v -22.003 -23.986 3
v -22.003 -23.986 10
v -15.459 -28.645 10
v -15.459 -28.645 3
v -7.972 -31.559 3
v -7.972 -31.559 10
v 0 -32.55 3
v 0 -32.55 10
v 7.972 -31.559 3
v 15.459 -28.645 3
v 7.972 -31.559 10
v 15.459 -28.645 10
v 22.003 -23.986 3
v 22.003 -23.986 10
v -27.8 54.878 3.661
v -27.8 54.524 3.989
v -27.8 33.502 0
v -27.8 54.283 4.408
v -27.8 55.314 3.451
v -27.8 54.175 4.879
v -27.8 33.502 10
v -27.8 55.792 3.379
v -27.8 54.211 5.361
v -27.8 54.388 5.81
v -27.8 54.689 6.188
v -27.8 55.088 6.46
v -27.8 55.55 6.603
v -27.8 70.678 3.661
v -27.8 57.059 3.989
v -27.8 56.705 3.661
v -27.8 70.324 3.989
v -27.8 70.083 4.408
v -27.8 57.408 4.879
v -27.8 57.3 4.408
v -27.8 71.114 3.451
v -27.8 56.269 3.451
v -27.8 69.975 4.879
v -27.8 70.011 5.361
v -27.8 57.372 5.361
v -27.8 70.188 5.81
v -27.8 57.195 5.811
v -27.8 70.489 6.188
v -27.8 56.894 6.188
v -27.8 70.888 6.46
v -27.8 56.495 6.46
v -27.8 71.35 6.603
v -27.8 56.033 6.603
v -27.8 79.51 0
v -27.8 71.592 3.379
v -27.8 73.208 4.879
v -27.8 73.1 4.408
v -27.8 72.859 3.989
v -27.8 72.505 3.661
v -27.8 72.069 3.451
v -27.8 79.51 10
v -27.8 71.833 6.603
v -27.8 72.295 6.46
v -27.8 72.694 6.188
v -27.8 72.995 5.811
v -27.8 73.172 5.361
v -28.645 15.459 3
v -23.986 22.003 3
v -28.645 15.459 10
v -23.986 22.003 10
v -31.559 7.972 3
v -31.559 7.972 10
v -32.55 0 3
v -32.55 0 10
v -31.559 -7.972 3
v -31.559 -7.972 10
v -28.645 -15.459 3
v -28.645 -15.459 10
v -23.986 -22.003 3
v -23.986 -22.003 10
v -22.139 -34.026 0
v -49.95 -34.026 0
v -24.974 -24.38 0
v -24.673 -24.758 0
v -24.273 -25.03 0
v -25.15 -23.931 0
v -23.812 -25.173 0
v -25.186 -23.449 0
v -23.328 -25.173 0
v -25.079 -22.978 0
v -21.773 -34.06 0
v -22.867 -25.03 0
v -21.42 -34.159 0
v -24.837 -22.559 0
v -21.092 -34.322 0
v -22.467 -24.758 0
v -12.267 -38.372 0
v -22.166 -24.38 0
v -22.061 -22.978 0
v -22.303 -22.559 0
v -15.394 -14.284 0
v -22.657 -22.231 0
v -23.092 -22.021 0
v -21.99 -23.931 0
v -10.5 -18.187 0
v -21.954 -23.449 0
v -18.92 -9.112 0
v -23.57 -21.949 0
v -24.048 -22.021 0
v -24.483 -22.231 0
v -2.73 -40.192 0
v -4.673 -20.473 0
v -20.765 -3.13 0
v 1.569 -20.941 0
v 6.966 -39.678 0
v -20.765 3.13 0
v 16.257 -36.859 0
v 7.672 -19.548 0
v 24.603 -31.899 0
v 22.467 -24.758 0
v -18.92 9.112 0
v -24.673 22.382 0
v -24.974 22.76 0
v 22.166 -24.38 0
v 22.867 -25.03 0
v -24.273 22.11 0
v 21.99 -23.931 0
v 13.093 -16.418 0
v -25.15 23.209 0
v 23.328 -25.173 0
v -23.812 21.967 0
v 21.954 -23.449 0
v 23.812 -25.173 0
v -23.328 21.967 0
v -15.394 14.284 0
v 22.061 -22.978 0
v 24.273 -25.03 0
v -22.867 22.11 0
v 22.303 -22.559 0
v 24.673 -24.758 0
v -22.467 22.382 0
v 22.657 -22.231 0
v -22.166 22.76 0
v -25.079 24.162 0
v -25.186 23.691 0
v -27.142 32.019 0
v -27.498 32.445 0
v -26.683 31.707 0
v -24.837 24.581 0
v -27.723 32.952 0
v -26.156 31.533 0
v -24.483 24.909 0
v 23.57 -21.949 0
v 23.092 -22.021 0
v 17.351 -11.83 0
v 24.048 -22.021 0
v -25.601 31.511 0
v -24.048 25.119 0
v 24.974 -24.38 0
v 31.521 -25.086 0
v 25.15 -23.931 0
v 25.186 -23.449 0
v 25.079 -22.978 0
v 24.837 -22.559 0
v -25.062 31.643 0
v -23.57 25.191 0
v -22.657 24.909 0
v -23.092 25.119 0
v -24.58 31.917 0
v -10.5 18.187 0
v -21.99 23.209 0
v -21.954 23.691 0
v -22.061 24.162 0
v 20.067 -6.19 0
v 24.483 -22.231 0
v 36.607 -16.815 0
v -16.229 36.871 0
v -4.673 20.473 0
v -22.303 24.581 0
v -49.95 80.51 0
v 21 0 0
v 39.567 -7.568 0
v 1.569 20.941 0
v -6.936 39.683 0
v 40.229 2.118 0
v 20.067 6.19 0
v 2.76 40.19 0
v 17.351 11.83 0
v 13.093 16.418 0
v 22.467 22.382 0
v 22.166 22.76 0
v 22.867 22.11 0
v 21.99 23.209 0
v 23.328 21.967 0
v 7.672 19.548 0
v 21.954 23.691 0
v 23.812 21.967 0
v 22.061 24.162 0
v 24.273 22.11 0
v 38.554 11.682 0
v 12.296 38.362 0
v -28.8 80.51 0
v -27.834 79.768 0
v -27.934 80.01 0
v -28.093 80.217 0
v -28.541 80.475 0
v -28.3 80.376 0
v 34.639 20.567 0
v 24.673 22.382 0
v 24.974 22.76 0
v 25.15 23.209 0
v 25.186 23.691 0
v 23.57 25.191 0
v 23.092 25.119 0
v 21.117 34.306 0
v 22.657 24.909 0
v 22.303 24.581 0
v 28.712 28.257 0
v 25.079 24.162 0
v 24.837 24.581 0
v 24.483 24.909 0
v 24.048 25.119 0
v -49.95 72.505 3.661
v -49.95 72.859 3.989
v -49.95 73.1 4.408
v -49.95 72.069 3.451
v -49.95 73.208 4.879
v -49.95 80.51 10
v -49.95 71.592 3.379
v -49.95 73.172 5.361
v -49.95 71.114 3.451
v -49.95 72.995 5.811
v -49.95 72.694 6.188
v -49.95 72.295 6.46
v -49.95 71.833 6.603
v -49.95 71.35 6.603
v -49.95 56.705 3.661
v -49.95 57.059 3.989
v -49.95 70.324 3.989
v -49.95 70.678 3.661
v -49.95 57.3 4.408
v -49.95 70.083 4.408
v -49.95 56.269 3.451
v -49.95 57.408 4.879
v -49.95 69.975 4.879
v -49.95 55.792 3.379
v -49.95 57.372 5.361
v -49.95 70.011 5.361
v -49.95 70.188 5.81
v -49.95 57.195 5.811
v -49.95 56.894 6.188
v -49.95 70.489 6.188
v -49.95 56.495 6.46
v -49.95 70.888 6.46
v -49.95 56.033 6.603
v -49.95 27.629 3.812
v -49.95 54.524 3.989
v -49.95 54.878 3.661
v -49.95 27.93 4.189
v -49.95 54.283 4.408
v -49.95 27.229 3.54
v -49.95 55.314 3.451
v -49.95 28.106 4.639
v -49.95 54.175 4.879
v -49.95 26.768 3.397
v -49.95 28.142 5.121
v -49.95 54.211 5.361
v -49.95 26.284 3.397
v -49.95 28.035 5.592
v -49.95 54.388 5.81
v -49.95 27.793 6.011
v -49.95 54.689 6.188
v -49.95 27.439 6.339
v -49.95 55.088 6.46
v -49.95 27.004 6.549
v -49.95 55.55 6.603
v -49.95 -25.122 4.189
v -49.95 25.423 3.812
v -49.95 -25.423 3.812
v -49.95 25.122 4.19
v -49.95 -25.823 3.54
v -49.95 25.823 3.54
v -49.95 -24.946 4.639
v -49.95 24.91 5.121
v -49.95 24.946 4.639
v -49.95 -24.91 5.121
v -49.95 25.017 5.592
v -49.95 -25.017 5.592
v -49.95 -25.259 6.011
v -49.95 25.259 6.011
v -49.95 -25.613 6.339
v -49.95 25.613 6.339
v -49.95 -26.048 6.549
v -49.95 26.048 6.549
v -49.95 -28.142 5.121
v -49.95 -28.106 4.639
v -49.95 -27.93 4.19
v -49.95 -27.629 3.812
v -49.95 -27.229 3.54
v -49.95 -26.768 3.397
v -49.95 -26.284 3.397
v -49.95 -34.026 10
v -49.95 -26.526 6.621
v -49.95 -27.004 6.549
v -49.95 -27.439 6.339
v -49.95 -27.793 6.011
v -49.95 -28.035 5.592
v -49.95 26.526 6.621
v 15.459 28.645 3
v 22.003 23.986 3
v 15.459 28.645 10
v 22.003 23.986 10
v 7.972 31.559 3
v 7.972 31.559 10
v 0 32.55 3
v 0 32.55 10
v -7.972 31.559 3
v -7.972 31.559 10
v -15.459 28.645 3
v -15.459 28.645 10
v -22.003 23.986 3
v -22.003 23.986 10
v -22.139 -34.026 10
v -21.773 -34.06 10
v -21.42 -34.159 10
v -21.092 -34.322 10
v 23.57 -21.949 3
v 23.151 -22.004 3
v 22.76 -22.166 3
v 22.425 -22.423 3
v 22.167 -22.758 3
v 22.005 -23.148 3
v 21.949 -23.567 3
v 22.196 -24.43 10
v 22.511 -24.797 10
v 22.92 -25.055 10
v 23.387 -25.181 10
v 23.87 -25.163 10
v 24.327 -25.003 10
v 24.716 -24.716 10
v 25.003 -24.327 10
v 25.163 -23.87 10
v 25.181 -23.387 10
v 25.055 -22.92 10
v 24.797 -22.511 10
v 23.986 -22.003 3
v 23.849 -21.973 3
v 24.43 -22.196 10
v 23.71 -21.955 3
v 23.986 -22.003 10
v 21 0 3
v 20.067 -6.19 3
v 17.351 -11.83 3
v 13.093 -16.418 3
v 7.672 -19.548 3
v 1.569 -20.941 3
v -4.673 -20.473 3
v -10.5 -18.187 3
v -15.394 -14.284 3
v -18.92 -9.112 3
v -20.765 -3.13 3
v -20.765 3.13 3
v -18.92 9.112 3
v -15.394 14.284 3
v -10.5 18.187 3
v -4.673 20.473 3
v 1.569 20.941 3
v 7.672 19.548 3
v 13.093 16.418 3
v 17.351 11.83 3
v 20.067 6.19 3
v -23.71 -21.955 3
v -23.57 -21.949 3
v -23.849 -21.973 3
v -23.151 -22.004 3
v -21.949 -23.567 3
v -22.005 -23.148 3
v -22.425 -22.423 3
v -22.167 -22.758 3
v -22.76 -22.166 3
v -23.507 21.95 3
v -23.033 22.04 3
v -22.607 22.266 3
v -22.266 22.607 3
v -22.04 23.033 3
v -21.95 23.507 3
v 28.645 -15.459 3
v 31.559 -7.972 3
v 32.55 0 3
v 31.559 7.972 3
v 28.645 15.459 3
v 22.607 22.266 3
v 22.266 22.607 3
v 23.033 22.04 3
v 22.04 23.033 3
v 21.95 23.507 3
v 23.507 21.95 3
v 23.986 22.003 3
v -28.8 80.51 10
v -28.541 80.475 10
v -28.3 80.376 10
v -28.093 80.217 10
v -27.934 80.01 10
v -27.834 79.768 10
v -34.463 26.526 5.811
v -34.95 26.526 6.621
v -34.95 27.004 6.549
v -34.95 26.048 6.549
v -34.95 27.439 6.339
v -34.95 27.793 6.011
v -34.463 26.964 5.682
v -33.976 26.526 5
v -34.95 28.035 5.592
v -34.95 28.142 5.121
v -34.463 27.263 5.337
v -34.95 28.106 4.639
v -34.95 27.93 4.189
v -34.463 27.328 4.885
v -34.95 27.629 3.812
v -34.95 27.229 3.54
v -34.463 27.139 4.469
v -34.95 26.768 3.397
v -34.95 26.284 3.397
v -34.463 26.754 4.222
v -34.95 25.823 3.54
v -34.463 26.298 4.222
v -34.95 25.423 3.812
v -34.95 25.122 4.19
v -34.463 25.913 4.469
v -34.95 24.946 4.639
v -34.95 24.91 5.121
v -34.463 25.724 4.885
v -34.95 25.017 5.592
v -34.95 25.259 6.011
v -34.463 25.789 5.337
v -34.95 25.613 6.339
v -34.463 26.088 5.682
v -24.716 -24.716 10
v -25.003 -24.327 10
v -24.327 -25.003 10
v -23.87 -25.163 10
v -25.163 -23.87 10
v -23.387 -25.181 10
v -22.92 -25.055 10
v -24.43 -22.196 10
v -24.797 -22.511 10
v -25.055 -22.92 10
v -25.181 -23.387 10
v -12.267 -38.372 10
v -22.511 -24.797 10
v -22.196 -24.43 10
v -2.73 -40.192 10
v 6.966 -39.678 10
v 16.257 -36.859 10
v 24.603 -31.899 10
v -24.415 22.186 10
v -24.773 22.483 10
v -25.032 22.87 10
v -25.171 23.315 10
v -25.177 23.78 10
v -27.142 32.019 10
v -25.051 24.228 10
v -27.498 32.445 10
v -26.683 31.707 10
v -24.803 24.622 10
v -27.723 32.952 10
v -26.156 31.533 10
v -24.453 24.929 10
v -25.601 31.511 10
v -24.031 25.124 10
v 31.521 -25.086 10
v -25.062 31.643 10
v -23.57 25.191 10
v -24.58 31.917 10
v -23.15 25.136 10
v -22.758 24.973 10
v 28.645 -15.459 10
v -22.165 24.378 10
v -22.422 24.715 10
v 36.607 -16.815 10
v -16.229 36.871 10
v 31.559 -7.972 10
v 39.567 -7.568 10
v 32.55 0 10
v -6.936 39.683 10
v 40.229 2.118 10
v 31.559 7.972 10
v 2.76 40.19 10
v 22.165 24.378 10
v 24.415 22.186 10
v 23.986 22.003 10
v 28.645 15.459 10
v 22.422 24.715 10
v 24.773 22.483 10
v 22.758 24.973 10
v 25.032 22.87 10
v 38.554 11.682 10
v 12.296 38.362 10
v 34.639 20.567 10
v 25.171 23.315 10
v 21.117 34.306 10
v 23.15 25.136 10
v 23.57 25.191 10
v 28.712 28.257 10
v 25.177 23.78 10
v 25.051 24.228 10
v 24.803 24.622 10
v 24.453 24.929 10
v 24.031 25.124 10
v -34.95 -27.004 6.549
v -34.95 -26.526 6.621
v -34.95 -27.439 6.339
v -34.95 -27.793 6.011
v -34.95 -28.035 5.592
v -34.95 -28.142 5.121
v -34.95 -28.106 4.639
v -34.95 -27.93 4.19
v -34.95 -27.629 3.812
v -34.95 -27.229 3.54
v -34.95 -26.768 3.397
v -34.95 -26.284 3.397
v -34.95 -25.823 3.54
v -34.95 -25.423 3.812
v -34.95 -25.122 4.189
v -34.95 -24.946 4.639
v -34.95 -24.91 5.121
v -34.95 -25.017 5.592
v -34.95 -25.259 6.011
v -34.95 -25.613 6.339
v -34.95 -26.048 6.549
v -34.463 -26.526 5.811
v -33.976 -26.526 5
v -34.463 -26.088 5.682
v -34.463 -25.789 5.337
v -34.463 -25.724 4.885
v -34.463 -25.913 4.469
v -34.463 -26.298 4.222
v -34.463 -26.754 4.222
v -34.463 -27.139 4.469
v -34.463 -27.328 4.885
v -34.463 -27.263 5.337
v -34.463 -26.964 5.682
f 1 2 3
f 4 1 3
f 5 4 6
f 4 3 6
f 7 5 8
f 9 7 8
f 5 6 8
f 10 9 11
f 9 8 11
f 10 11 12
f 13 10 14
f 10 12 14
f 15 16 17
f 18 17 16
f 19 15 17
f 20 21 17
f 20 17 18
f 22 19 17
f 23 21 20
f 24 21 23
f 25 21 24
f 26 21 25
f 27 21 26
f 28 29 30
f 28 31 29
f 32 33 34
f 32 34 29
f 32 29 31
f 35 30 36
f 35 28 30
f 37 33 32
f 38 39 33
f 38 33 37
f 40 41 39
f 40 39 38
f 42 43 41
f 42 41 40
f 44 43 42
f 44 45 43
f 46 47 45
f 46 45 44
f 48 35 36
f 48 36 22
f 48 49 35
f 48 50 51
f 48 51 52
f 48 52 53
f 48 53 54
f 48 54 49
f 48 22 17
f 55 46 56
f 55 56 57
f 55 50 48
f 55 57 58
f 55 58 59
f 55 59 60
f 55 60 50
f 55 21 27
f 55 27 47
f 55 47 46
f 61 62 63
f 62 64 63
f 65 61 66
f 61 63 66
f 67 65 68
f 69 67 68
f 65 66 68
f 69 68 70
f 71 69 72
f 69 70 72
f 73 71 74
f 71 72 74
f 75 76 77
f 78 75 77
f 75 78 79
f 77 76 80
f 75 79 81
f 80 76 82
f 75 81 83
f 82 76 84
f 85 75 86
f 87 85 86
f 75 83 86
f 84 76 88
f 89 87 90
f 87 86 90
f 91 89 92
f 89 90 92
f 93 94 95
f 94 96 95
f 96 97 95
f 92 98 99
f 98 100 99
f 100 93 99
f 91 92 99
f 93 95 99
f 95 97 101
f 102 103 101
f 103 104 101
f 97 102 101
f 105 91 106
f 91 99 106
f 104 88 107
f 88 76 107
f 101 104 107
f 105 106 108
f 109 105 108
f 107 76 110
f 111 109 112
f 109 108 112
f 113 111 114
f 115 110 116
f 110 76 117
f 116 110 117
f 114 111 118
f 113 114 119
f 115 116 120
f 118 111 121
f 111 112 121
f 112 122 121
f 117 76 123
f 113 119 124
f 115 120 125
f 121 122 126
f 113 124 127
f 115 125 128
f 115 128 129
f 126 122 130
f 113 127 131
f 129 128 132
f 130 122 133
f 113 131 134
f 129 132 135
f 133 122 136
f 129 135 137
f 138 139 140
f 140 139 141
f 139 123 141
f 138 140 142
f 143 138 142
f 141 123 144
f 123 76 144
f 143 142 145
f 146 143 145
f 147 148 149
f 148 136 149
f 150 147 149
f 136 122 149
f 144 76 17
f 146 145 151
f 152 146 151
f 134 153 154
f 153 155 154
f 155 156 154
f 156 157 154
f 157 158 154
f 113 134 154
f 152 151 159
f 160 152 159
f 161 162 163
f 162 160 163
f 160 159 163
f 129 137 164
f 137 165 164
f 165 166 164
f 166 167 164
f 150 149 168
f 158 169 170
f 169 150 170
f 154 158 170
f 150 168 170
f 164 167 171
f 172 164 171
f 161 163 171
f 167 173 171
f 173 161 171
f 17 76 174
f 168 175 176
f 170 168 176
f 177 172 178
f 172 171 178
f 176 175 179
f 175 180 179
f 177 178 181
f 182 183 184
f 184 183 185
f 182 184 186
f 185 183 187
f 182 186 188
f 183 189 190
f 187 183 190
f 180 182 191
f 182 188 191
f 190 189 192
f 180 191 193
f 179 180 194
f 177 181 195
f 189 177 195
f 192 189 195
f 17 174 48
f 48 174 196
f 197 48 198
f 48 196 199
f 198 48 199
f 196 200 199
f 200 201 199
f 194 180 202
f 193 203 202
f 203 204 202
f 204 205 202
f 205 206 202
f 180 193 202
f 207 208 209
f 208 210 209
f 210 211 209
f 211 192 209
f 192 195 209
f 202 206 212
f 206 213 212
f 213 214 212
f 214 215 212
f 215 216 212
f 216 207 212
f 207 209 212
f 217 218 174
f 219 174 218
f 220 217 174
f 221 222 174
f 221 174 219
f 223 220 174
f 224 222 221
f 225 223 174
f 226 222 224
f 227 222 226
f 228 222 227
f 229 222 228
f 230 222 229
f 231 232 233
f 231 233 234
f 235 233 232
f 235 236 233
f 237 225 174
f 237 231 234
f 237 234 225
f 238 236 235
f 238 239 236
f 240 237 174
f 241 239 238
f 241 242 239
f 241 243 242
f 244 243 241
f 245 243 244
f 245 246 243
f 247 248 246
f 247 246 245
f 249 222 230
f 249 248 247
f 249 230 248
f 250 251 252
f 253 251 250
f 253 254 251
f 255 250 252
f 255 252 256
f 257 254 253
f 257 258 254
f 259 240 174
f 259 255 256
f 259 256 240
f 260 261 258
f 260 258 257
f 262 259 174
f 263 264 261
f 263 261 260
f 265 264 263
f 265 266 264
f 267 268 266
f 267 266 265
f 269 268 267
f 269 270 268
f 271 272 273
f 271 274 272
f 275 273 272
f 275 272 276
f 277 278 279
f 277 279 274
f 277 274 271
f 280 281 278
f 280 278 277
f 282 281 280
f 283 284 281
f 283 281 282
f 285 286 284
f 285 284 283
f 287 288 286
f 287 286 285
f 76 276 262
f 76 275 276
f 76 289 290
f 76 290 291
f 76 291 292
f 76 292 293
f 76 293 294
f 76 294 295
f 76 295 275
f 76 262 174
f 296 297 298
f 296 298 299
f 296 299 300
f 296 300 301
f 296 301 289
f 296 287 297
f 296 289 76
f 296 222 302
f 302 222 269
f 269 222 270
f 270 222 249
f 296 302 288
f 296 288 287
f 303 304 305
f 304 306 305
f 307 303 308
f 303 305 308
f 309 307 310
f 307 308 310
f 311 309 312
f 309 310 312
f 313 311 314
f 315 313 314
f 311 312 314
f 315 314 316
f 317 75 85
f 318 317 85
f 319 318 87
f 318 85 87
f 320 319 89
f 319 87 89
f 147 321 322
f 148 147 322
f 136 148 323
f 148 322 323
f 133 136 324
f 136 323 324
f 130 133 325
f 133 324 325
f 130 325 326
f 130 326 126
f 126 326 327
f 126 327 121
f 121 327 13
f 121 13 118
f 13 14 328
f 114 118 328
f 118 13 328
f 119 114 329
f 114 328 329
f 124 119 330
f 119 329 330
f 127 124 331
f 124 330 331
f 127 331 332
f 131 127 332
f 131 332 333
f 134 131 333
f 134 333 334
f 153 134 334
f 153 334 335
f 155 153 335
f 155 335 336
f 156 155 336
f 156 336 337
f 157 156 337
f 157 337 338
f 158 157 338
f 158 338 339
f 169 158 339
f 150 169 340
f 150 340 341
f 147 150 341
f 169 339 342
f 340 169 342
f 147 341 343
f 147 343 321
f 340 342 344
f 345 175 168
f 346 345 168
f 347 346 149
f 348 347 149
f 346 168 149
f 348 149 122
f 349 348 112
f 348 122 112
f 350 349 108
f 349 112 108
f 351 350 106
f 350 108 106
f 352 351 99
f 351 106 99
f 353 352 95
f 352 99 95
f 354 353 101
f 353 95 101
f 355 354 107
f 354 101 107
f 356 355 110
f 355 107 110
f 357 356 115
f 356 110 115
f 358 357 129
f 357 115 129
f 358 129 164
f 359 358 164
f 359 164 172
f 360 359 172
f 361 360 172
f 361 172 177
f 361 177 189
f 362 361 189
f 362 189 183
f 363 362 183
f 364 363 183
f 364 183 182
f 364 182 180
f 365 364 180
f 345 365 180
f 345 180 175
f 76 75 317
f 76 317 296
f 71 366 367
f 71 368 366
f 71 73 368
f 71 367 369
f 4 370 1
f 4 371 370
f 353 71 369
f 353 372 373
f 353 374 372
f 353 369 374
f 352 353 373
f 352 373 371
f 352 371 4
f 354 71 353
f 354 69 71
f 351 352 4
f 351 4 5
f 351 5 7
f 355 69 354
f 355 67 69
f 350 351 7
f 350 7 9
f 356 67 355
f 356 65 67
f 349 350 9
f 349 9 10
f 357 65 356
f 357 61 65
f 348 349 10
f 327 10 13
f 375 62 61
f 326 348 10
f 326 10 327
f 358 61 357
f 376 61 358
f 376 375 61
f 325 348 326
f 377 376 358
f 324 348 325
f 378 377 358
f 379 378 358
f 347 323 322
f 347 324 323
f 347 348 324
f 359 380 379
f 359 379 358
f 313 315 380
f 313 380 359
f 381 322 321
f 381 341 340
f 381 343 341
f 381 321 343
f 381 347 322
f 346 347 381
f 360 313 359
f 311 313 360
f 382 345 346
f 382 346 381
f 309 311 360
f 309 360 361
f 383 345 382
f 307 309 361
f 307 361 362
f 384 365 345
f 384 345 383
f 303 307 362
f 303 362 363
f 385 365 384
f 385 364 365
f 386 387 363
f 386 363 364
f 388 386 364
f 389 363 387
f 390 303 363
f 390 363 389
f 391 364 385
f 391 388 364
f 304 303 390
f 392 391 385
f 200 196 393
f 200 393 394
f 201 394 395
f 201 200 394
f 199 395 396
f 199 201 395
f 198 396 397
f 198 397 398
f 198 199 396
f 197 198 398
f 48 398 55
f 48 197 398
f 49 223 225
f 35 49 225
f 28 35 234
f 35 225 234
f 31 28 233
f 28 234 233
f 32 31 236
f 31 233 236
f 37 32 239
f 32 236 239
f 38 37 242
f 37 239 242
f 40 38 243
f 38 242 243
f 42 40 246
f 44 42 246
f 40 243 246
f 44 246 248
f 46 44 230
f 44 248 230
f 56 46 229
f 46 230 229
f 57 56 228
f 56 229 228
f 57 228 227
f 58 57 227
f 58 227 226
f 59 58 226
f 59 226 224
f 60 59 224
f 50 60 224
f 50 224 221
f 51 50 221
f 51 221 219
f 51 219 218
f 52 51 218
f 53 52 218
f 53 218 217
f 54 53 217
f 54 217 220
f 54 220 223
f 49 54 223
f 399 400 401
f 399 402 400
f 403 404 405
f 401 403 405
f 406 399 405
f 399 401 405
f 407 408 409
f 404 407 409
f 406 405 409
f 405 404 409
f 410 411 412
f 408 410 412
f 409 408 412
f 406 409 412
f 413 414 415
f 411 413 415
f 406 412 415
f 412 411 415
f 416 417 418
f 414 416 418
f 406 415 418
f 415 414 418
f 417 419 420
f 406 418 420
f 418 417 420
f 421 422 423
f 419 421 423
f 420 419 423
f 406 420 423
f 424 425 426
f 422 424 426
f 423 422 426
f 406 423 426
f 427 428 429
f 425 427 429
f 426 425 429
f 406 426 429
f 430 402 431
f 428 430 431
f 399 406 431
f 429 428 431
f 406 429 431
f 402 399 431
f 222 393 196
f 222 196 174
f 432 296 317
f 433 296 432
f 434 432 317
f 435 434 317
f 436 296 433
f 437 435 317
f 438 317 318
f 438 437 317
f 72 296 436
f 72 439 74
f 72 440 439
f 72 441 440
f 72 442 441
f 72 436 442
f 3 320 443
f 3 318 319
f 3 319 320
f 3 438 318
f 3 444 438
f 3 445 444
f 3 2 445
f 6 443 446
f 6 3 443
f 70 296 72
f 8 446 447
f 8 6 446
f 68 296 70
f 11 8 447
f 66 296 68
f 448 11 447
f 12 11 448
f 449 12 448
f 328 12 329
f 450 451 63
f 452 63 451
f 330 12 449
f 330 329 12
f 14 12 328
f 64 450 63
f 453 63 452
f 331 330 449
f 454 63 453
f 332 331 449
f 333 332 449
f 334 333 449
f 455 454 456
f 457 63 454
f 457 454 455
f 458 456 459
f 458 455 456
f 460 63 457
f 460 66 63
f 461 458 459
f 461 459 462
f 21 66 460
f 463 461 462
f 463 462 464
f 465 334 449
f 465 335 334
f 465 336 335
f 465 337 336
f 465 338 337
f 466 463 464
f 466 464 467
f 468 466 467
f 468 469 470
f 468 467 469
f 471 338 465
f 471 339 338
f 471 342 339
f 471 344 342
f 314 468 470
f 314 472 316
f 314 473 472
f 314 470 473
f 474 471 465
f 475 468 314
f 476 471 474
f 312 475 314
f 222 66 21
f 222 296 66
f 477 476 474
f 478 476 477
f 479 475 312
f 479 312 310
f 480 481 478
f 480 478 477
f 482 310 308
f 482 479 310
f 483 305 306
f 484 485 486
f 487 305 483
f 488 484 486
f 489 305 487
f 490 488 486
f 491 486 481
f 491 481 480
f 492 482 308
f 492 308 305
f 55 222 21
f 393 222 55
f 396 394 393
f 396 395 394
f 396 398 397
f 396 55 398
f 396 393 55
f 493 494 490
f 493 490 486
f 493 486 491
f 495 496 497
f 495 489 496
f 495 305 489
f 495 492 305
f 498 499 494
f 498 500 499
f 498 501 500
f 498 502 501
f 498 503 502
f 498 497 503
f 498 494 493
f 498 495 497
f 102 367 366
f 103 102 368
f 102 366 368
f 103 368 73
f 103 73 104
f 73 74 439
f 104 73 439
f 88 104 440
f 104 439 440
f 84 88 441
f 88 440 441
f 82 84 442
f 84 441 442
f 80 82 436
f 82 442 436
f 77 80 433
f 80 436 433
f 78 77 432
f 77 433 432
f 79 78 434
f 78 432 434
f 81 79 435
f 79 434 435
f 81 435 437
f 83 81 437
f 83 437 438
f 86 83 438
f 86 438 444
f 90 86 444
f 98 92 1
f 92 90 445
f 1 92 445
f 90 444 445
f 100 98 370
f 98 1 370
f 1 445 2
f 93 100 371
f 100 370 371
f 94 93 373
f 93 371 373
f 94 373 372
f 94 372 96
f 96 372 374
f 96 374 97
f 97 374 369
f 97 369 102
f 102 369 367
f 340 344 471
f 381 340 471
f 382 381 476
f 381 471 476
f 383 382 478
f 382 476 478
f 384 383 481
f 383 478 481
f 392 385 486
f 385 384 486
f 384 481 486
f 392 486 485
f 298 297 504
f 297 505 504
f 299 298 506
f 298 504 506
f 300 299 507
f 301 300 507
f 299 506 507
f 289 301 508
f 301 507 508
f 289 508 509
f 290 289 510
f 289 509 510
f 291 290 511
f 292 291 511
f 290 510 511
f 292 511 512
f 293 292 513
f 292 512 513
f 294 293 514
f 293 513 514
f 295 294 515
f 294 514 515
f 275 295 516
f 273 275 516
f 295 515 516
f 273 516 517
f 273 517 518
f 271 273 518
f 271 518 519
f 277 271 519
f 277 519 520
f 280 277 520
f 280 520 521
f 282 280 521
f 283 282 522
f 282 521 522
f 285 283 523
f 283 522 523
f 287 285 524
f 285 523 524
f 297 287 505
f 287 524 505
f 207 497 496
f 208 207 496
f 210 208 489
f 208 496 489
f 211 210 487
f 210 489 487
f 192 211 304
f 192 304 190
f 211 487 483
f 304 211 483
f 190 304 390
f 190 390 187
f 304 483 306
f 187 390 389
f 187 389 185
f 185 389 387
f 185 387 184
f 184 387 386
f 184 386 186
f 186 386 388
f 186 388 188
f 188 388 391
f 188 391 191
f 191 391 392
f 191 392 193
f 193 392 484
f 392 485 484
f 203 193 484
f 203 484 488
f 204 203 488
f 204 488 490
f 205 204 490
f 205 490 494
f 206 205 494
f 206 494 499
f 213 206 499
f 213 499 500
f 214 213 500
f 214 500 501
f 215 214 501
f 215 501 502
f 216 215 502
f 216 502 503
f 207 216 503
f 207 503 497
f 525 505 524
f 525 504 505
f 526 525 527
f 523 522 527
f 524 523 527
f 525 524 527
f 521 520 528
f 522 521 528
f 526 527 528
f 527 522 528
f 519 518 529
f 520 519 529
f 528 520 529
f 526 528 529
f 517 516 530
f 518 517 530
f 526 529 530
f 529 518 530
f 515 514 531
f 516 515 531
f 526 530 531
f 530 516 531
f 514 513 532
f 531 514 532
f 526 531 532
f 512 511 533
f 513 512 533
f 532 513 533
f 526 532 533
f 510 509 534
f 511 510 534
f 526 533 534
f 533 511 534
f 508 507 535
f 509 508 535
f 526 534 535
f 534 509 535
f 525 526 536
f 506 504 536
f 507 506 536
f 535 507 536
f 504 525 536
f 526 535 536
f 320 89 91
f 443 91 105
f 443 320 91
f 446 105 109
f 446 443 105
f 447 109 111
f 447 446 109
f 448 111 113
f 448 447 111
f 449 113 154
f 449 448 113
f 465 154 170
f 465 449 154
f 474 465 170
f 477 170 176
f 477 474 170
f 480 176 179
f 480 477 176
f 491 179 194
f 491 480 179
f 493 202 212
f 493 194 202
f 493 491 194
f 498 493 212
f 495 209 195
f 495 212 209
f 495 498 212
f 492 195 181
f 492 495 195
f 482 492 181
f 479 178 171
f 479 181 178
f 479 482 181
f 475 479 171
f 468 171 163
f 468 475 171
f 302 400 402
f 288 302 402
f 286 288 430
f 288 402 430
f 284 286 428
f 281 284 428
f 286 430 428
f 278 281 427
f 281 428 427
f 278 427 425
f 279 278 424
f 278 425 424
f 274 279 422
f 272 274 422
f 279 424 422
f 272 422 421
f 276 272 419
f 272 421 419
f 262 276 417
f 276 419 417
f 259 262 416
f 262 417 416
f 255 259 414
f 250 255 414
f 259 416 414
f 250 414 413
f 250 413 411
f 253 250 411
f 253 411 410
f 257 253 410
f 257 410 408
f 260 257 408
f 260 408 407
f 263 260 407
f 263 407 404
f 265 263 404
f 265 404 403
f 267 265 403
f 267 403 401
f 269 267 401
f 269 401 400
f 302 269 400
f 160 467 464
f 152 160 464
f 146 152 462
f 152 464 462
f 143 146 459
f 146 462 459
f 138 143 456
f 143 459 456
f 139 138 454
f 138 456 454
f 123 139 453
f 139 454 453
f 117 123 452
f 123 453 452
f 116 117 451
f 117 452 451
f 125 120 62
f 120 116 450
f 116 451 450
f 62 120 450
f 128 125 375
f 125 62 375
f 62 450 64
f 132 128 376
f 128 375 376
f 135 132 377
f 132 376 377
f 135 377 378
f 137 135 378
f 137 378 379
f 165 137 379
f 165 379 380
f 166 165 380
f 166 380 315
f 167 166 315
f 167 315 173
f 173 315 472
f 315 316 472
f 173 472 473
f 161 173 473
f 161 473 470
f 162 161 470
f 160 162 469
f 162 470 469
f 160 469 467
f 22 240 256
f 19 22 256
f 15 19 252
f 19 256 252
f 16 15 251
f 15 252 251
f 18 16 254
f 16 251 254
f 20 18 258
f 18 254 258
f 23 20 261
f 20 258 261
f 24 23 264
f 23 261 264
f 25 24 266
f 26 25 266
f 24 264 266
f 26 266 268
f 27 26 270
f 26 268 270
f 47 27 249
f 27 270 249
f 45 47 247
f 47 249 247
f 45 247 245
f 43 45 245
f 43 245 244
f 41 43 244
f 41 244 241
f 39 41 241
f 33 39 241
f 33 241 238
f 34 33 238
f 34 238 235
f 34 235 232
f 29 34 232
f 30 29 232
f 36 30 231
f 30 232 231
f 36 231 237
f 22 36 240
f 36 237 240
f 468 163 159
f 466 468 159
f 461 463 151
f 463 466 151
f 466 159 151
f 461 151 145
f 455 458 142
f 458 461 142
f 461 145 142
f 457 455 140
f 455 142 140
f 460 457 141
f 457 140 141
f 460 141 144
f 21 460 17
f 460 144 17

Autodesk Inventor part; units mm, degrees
ref_plane "YZ Plane" through (0, 0, 0) normal (1, 0, 0) x (0, 1, 0)
ref_plane "XZ Plane" through (0, 0, 0) normal (0, 1, 0) x (-1, 0, 0)
ref_plane "Work Plane1" through (0, 0, 0) normal (0, 0, 1) x (1, 0, 0)
sketch "Sketch1" plane through (0, 0, 0) normal (0, 0, 1) x (1, 0, 0)
  circle A0 centre (0, 0) radius 21 projected
  circle A1 centre (23.57, -23.57) radius 2 projected
  circle A2 centre (23.57, 23.57) radius 2 projected
  circle A3 centre (-23.57, -23.57) radius 2.5 projected
  circle A4 centre (-23.57, 23.57) radius 2 projected
  circle A5 centre (-23.57, -23.57) radius 2 projected
  circle A6 centre (0, 0) radius 19 projected
  circle A7 centre (-23.57, 23.57) radius 2.5 projected
  circle A8 centre (-23.57, -23.57) radius 2.5 projected
  arc A9 (-29.95, -24.95) -> (-24.95, -29.95) centre (-24.95, -24.95) ccw projected
  line L0 (24.95, -29.95) -> (-24.95, -29.95) projected
  arc A10 (24.95, -29.95) -> (29.95, -24.95) centre (24.95, -24.95) ccw projected
  line L1 (29.95, 24.95) -> (29.95, -24.95) projected
  arc A11 (29.95, 24.95) -> (24.95, 29.95) centre (24.95, 24.95) ccw projected
  line L2 (-24.95, 29.95) -> (24.95, 29.95) projected
  arc A12 (-24.95, 29.95) -> (-29.95, 24.95) centre (-24.95, 24.95) ccw projected
  line L3 (-29.95, -24.95) -> (-29.95, 24.95) projected
  circle A13 centre (23.57, -23.57) radius 2.5 projected
  circle A14 centre (23.57, 23.57) radius 2.5 projected
  line L4 (-49.95, -90) -> (-49.95, 90) projected
  line L5 (-59.95, -90) -> (-49.95, -90)
  line L6 (-59.95, 90) -> (-49.95, 90)
  line L7 (40.2846, 0) -> (-40.2846, 0)
  line L8 (-49.95, -90) -> (-49.95, 90) projected
  line L9 (-59.95, -90) -> (-49.95, -90)
  line L10 (-49.95, 35.5095) -> (-26.95, 35.5095) projected
  line L11 (-24.95, 29.95) -> (-49.95, 29.95)
  line L12 (-24.95, -29.95) -> (-49.95, -29.95)
  circle A15 centre (0, 0) radius 22
  line L13 (-32.95, 22) -> (-32.95, -22) projected
  line L14 (-30.95, -14.95) -> (-49.95, -14.95)
  line L15 (-30.95, 14.95) -> (-49.95, 14.95)
  line L16 (-30.95, -14.95) -> (-30.95, 14.95)
  line L17 (24.7214, -34.026) -> (0, -42.0585)
  line L18 (0, -42.0585) -> (-24.7214, -34.026)
  line L19 (-24.7214, -34.026) -> (-40, -12.9968)
  line L20 (-40, -12.9968) -> (-40, 12.9968)
  line L21 (-40, 12.9968) -> (-24.7214, 34.026)
  line L22 (-24.7214, 34.026) -> (0, 42.0585)
  line L23 (0, 42.0585) -> (24.7214, 34.026)
  line L24 (24.7214, 34.026) -> (40, 12.9968)
  line L25 (40, 12.9968) -> (40, -12.9968)
  line L26 (40, -12.9968) -> (24.7214, -34.026)
  line L27 (-24.7214, -34.026) -> (-49.95, -34.026)
  line L28 (-24.7214, 34.026) -> (-49.95, 34.026)
  arc A16 (-24.7214, -34.026) -> (-24.7214, 34.026) centre (0, 0) ccw projected
  line L29 (-24.7214, 34.026) -> (-27.8, 34.026) projected
  line L30 (-27.8, 34.026) -> (-27.8, 80.5095) projected
  line L31 (-27.8, 80.5095) -> (-49.95, 80.5095) projected
  line L32 (-49.95, 80.5095) -> (-49.95, 14.95) projected
  line L33 (-49.95, 14.95) -> (-35.95, 14.95) projected
  arc A17 (-30.95, 9.95) -> (-35.95, 14.95) centre (-35.95, 9.95) ccw projected
  line L34 (-30.95, 9.95) -> (-30.95, -9.95) projected
  arc A18 (-35.95, -14.95) -> (-30.95, -9.95) centre (-35.95, -9.95) ccw projected
  line L35 (-35.95, -14.95) -> (-49.95, -14.95) projected
  line L36 (-49.95, -14.95) -> (-49.95, -34.026) projected
  line L37 (-49.95, -34.026) -> (-24.7214, -34.026) projected
  circle A19 centre (15.9909, -0.539) radius 1.6 projected
  circle A20 centre (-11.6884, -10.9261) radius 2 projected
  circle A21 centre (11.6884, 10.9261) radius 2 projected
  circle A22 centre (10.9261, -11.6884) radius 2 projected
  circle A23 centre (-15.9909, 0.539) radius 1.6 projected
  circle A24 centre (-0.539, -15.9909) radius 1.6 projected
  circle A25 centre (0, 0) radius 12.5 projected
  circle A26 centre (0.539, 15.9909) radius 1.6 projected
  circle A27 centre (-10.9261, 11.6884) radius 2 projected
  point P0 (0, 0)
  point P1 (-23.2856, -45.1645)
  point P2 (-49.95, -75.9684)
  point P3 (-23.2856, 45.1645)
  point P4 (-49.95, -14.95)
  point P5 (-32.95, 13.95)
  point P6 (-32.95, 14.95)
  dimension "d9" = 1
  dimension "d10" = 15
  dimension "d11" = 15
  dimension "d12" = 1
  dimension "d13" = 40
extrude "Extrusion1" add sketch "Sketch1" along normal blind 10 contours L7 A15 A0 | A0 L7 A15 | A15 L7 L3 A12 L2 A11 L1 | L7 L1 A10 L0 A9 L3 A15 | L7 L25 L26 L17 L18 L19 L12 L0 A10 L1 | L1 A11 L2 L11 L21 L22 L23 L24 L25 L7 | L7 L16 L15 L21 L11 A12 L3 | L3 A9 L12 L19 L14 L16 L7 | L25 A16 | L16 A18 L13 L7 | L7 L13 A17 L16 | L24 A16 | A16 L26 | L13 A18 L14 L19 L20 L7 | L7 L20 L21 L15 A17 L13 | L16 L14 L13 A18 | A17 L13 L15 L16 | L23 A16 | A16 L17 | L19 L27 L4 L12 | L12 L4 L14 L19 | L21 L15 L4 L11 | L11 L4 L28 L21 | L20 L19 L14 L4 L15 L21 | A17 L15 L13 | L13 L14 A18 | L22 A16 | A16 L18 | A1 | A2 | A3 | A4 | A5 | A7 | A13 | A14
sketch "Sketch2" plane through (-49.95, -34.026, 0) normal (-1, 0, 0) x (0, 0, 1)
  line L0 (0, 68.0521) -> (0, 0) projected
  line L1 (0, 0) -> (10, 0) projected
  line L2 (10, 68.0521) -> (10, 0) projected
  line L3 (0, 68.0521) -> (0, 0) projected
  line L4 (10, 68.0521) -> (10, 0) projected
  line L5 (0, 68.0521) -> (10, 68.0521) projected
  line L6 (0, 0) -> (10, 0) projected
  line L7 (0, 68.0521) -> (10, 68.0521) projected
  point P0 (0, 34.026)
  point P1 (5, 7.5)
  point P2 (5, 60.5521)
  point P3 (5, 68.0521)
  point P4 (5, 19.076)
  dimension "d24" = 7.5
  dimension "d25" = 7.5
hole "Hole1" at (-49.95, 26.526, 5) at (-49.95, -26.526, 5) direction (1, 0, 0) diameter 3.242 depth 15 tip angle 118 thread size "M4x0.7" class "6H" standard "ISO Metric profile"
sketch "Sketch3" plane through (0, 0, 10) normal (0, 0, 1) x (1, 0, 0)
  arc A0 (-24.7214, -34.026) -> (-24.7214, 34.026) centre (0, 0) ccw projected
  line L0 (-24.7214, 34.026) -> (-27.8, 34.026) projected
  line L1 (-27.8, 34.026) -> (-27.8, 80.5095) projected
  line L2 (-27.8, 80.5095) -> (-49.95, 80.5095) projected
  line L3 (-49.95, 80.5095) -> (-49.95, 14.95) projected
  line L4 (-49.95, 14.95) -> (-35.95, 14.95) projected
  arc A1 (-30.95, 9.95) -> (-35.95, 14.95) centre (-35.95, 9.95) ccw projected
  line L5 (-30.95, 9.95) -> (-30.95, -9.95) projected
  arc A2 (-35.95, -14.95) -> (-30.95, -9.95) centre (-35.95, -9.95) ccw projected
  line L6 (-35.95, -14.95) -> (-49.95, -14.95) projected
  line L7 (-49.95, -14.95) -> (-49.95, -34.026) projected
  line L8 (-49.95, -34.026) -> (-24.7214, -34.026) projected
  circle A3 centre (15.9909, -0.539) radius 1.6 projected
  circle A4 centre (-11.6884, -10.9261) radius 2 projected
  circle A5 centre (11.6884, 10.9261) radius 2 projected
  circle A6 centre (10.9261, -11.6884) radius 2 projected
  circle A7 centre (-15.9909, 0.539) radius 1.6 projected
  circle A8 centre (-0.539, -15.9909) radius 1.6 projected
  circle A9 centre (0, 0) radius 12.5 projected
  circle A10 centre (0.539, 15.9909) radius 1.6 projected
  circle A11 centre (-10.9261, 11.6884) radius 2 projected
  circle A12 centre (0, 0) radius 19 projected
  circle A13 centre (-23.57, 23.57) radius 2.5 projected
  circle A14 centre (-23.57, -23.57) radius 2.5 projected
  arc A15 (-29.95, -24.95) -> (-24.95, -29.95) centre (-24.95, -24.95) ccw projected
  line L9 (24.95, -29.95) -> (-24.95, -29.95) projected
  arc A16 (24.95, -29.95) -> (29.95, -24.95) centre (24.95, -24.95) ccw projected
  line L10 (29.95, 24.95) -> (29.95, -24.95) projected
  arc A17 (29.95, 24.95) -> (24.95, 29.95) centre (24.95, 24.95) ccw projected
  line L11 (-24.95, 29.95) -> (24.95, 29.95) projected
  arc A18 (-24.95, 29.95) -> (-29.95, 24.95) centre (-24.95, 24.95) ccw projected
  line L12 (-29.95, -24.95) -> (-29.95, 24.95) projected
  circle A19 centre (23.57, -23.57) radius 2.5 projected
  circle A20 centre (23.57, 23.57) radius 2.5 projected
  arc A21 (-37.4079, -14.95) -> (-37.4079, 14.95) centre (0, 0) ccw
  line L13 (-27.8, 34.026) -> (-27.8, 29.155)
  line L14 (-49.95, -34.026) -> (-21.5657, -34.026)
  line L15 (-49.95, -34.026) -> (-24.7214, -34.026) projected
  point P0 (0, 0)
  point P1 (-24.7214, -34.026)
extrude "Extrusion2" cut sketch "Sketch3" against normal blind 10 contours L14 A21 L13 L0 A0
sketch "Sketch4" plane through (0, 0, 10) normal (0, 0, 1) x (1, 0, 0)
  arc A0 (-24.7214, -34.026) -> (-24.7214, 34.026) centre (0, 0) ccw projected
  line L0 (-24.7214, 34.026) -> (-27.8, 34.026) projected
  line L1 (-27.8, 34.026) -> (-27.8, 80.5095) projected
  line L2 (-27.8, 80.5095) -> (-49.95, 80.5095) projected
  line L3 (-49.95, 80.5095) -> (-49.95, 14.95) projected
  line L4 (-49.95, 14.95) -> (-35.95, 14.95) projected
  arc A1 (-30.95, 9.95) -> (-35.95, 14.95) centre (-35.95, 9.95) ccw projected
  line L5 (-30.95, 9.95) -> (-30.95, -9.95) projected
  arc A2 (-35.95, -14.95) -> (-30.95, -9.95) centre (-35.95, -9.95) ccw projected
  line L6 (-35.95, -14.95) -> (-49.95, -14.95) projected
  line L7 (-49.95, -14.95) -> (-49.95, -34.026) projected
  line L8 (-49.95, -34.026) -> (-24.7214, -34.026) projected
  circle A3 centre (15.9909, -0.539) radius 1.6 projected
  circle A4 centre (-11.6884, -10.9261) radius 2 projected
  circle A5 centre (11.6884, 10.9261) radius 2 projected
  circle A6 centre (10.9261, -11.6884) radius 2 projected
  circle A7 centre (-15.9909, 0.539) radius 1.6 projected
  circle A8 centre (-0.539, -15.9909) radius 1.6 projected
  circle A9 centre (0, 0) radius 12.5 projected
  circle A10 centre (0.539, 15.9909) radius 1.6 projected
  circle A11 centre (-10.9261, 11.6884) radius 2 projected
  line L9 (-49.95, -90) -> (-49.95, 90) projected
  line L10 (-59.95, 90) -> (-49.95, 90)
  line L11 (-49.95, -90) -> (-49.95, 90) projected
  line L12 (-27.8, 29.155) -> (-27.8, 34.026) projected
  line L13 (-27.8, 34.026) -> (-49.95, 34.026) projected
  line L14 (-49.95, 34.026) -> (-49.95, -34.026) projected
  line L15 (-49.95, -34.026) -> (-21.5657, -34.026) projected
  arc A12 (-21.5657, -34.026) -> (-27.8, 29.155) centre (0, 0) ccw projected
  circle A13 centre (0, 0) radius 21 projected
  point P0 (0, 0)
extrude "Extrusion3" add sketch "Sketch4" against normal blind 10 contours L13 L3 L2 L1
fillet "Fillet1" radius 2 2 edges at (-27.8, 29.155, 5) (-21.5657, -34.026, 5)
fillet "Fillet2" radius 1 1 edges at (-27.8, 80.5095, 5)
sketch "Sketch5" plane through (-27.8, 33.5015, 10) normal (1, 0, 0) x (0, 0, -1)
  arc A0 (8, 9.19) -> (10, 11.19) centre (8, 11.19) ccw projected
  line L0 (10, 49.19) -> (10, 11.19) projected
  arc A1 (10, 49.19) -> (8, 51.19) centre (8, 49.19) ccw projected
  line L1 (-60.5, 51.19) -> (8, 51.19) projected
  arc A2 (-60.5, 51.19) -> (-62.5, 49.19) centre (-60.5, 49.19) ccw projected
  line L2 (-62.5, 11.19) -> (-62.5, 49.19) projected
  arc A3 (-62.5, 11.19) -> (-60.5, 9.19) centre (-60.5, 11.19) ccw projected
  line L3 (8, 9.19) -> (-60.5, 9.19) projected
  circle A4 centre (-26.25, 30.19) radius 12.6 projected
  circle A5 centre (-26.25, 14.19) radius 2 projected
  arc A6 (-59.6, 14.79) -> (-55.4, 14.79) centre (-57.5, 14.79) ccw projected
  line L4 (-59.6, 45.59) -> (-59.6, 14.79) projected
  arc A7 (-55.4, 45.59) -> (-59.6, 45.59) centre (-57.5, 45.59) ccw projected
  line L5 (-55.4, 14.79) -> (-55.4, 45.59) projected
  circle A8 centre (-42.25, 30.19) radius 2 projected
  circle A9 centre (-37.5637, 18.8763) radius 1.5 projected
  circle A10 centre (-37.5637, 41.5037) radius 1.5 projected
  circle A11 centre (-14.9363, 18.8763) radius 1.5 projected
  arc A12 (7.1, 45.59) -> (2.9, 45.59) centre (5, 45.59) ccw projected
  line L6 (7.1, 14.79) -> (7.1, 45.59) projected
  arc A13 (2.9, 14.79) -> (7.1, 14.79) centre (5, 14.79) ccw projected
  line L7 (2.9, 45.59) -> (2.9, 14.79) projected
  circle A14 centre (-10.25, 30.19) radius 2 projected
  circle A15 centre (-14.9363, 41.5037) radius 1.5 projected
  circle A16 centre (-26.25, 46.19) radius 2 projected
  circle A17 centre (-57.5, 11.46) radius 1.621 projected
  circle A18 centre (-57.5, 26.86) radius 1.621 projected
  arc A19 (8, 9.19) -> (10, 11.19) centre (8, 11.19) ccw projected
  line L8 (10, 49.19) -> (10, 11.19) projected
  arc A20 (10, 49.19) -> (8, 51.19) centre (8, 49.19) ccw projected
  line L9 (-60.5, 51.19) -> (8, 51.19) projected
  arc A21 (-60.5, 51.19) -> (-62.5, 49.19) centre (-60.5, 49.19) ccw projected
  line L10 (-62.5, 11.19) -> (-62.5, 49.19) projected
  arc A22 (-62.5, 11.19) -> (-60.5, 9.19) centre (-60.5, 11.19) ccw projected
  line L11 (8, 9.19) -> (-60.5, 9.19) projected
  circle A23 centre (-26.25, 30.19) radius 12.6 projected
  circle A24 centre (-26.25, 14.19) radius 2 projected
  arc A25 (-59.6, 14.79) -> (-55.4, 14.79) centre (-57.5, 14.79) ccw projected
  line L12 (-59.6, 45.59) -> (-59.6, 14.79) projected
  arc A26 (-55.4, 45.59) -> (-59.6, 45.59) centre (-57.5, 45.59) ccw projected
  line L13 (-55.4, 14.79) -> (-55.4, 45.59) projected
  circle A27 centre (-42.25, 30.19) radius 2 projected
  circle A28 centre (-37.5637, 18.8763) radius 1.5 projected
  circle A29 centre (-37.5637, 41.5037) radius 1.5 projected
  circle A30 centre (-14.9363, 18.8763) radius 1.5 projected
  arc A31 (7.1, 45.59) -> (2.9, 45.59) centre (5, 45.59) ccw projected
  line L14 (7.1, 14.79) -> (7.1, 45.59) projected
  arc A32 (2.9, 14.79) -> (7.1, 14.79) centre (5, 14.79) ccw projected
  line L15 (2.9, 45.59) -> (2.9, 14.79) projected
  circle A33 centre (-10.25, 30.19) radius 2 projected
  circle A34 centre (-14.9363, 41.5037) radius 1.5 projected
  circle A35 centre (-26.25, 46.19) radius 2 projected
  arc A36 (8, 9.19) -> (10, 11.19) centre (8, 11.19) ccw projected
  line L16 (10, 49.19) -> (10, 11.19) projected
  arc A37 (10, 49.19) -> (8, 51.19) centre (8, 49.19) ccw projected
  line L17 (-60.5, 51.19) -> (8, 51.19) projected
  arc A38 (-60.5, 51.19) -> (-62.5, 49.19) centre (-60.5, 49.19) ccw projected
  line L18 (-62.5, 11.19) -> (-62.5, 49.19) projected
  arc A39 (-62.5, 11.19) -> (-60.5, 9.19) centre (-60.5, 11.19) ccw projected
  line L19 (8, 9.19) -> (-60.5, 9.19) projected
  circle A40 centre (-26.25, 30.19) radius 12.6 projected
  circle A41 centre (-26.25, 14.19) radius 2 projected
  arc A42 (-59.6, 14.79) -> (-55.4, 14.79) centre (-57.5, 14.79) ccw projected
  line L20 (-59.6, 45.59) -> (-59.6, 14.79) projected
  arc A43 (-55.4, 45.59) -> (-59.6, 45.59) centre (-57.5, 45.59) ccw projected
  line L21 (-55.4, 14.79) -> (-55.4, 45.59) projected
  circle A44 centre (-42.25, 30.19) radius 2 projected
  circle A45 centre (-37.5637, 18.8763) radius 1.5 projected
  circle A46 centre (-37.5637, 41.5037) radius 1.5 projected
  circle A47 centre (-14.9363, 18.8763) radius 1.5 projected
  arc A48 (7.1, 45.59) -> (2.9, 45.59) centre (5, 45.59) ccw projected
  line L22 (7.1, 14.79) -> (7.1, 45.59) projected
  arc A49 (2.9, 14.79) -> (7.1, 14.79) centre (5, 14.79) ccw projected
  line L23 (2.9, 45.59) -> (2.9, 14.79) projected
  circle A50 centre (-10.25, 30.19) radius 2 projected
  circle A51 centre (-14.9363, 41.5037) radius 1.5 projected
  circle A52 centre (-26.25, 46.19) radius 2 projected
  point P0 (10, -33.5015)
  point P1 (5, 22.29)
  point P2 (5, 38.09)
  dimension "d47" = 7.5
  dimension "d48" = 7.5
hole "Hole2" at (-27.8, 55.7915, 5) at (-27.8, 71.5915, 5) direction (-1, 0, 0) diameter 3.242 depth 22.15 thread size "M4x0.7" class "6H" standard "ISO Metric profile"
sketch "Sketch7" plane through (0, 0, 10) normal (0, 0, 1) x (1, 0, 0)
  circle A0 centre (0, 0) radius 32.55
  dimension "d49" = 65.1
extrude "Extrusion5" cut sketch "Sketch7" against normal blind 7
sketch "Sketch10" plane through (0, 0, 0) normal (0, 0, -1) x (-1, 0, 0)
  point P0 (0, 0)
  point P1 (-23.57, -23.57)
  point P2 (-23.57, 23.57)
  point P3 (23.57, 23.57)
  point P4 (23.57, -23.57)
hole "Hole3" at (23.57, -23.57, 0) at (23.57, 23.57, 0) at (-23.57, 23.57, 0) at (-23.57, -23.57, 0) direction (0, 0, 1) diameter 3.242 depth 12 tip angle 118 thread size "M4x0.7" class "6H" standard "ISO Metric profile"
equation "\"d11\" = d10"
equation "\"d25\" = d24"
equation "\"d48\" = d47"
properties part number "motorFrame" material "Aluminum 6061"
